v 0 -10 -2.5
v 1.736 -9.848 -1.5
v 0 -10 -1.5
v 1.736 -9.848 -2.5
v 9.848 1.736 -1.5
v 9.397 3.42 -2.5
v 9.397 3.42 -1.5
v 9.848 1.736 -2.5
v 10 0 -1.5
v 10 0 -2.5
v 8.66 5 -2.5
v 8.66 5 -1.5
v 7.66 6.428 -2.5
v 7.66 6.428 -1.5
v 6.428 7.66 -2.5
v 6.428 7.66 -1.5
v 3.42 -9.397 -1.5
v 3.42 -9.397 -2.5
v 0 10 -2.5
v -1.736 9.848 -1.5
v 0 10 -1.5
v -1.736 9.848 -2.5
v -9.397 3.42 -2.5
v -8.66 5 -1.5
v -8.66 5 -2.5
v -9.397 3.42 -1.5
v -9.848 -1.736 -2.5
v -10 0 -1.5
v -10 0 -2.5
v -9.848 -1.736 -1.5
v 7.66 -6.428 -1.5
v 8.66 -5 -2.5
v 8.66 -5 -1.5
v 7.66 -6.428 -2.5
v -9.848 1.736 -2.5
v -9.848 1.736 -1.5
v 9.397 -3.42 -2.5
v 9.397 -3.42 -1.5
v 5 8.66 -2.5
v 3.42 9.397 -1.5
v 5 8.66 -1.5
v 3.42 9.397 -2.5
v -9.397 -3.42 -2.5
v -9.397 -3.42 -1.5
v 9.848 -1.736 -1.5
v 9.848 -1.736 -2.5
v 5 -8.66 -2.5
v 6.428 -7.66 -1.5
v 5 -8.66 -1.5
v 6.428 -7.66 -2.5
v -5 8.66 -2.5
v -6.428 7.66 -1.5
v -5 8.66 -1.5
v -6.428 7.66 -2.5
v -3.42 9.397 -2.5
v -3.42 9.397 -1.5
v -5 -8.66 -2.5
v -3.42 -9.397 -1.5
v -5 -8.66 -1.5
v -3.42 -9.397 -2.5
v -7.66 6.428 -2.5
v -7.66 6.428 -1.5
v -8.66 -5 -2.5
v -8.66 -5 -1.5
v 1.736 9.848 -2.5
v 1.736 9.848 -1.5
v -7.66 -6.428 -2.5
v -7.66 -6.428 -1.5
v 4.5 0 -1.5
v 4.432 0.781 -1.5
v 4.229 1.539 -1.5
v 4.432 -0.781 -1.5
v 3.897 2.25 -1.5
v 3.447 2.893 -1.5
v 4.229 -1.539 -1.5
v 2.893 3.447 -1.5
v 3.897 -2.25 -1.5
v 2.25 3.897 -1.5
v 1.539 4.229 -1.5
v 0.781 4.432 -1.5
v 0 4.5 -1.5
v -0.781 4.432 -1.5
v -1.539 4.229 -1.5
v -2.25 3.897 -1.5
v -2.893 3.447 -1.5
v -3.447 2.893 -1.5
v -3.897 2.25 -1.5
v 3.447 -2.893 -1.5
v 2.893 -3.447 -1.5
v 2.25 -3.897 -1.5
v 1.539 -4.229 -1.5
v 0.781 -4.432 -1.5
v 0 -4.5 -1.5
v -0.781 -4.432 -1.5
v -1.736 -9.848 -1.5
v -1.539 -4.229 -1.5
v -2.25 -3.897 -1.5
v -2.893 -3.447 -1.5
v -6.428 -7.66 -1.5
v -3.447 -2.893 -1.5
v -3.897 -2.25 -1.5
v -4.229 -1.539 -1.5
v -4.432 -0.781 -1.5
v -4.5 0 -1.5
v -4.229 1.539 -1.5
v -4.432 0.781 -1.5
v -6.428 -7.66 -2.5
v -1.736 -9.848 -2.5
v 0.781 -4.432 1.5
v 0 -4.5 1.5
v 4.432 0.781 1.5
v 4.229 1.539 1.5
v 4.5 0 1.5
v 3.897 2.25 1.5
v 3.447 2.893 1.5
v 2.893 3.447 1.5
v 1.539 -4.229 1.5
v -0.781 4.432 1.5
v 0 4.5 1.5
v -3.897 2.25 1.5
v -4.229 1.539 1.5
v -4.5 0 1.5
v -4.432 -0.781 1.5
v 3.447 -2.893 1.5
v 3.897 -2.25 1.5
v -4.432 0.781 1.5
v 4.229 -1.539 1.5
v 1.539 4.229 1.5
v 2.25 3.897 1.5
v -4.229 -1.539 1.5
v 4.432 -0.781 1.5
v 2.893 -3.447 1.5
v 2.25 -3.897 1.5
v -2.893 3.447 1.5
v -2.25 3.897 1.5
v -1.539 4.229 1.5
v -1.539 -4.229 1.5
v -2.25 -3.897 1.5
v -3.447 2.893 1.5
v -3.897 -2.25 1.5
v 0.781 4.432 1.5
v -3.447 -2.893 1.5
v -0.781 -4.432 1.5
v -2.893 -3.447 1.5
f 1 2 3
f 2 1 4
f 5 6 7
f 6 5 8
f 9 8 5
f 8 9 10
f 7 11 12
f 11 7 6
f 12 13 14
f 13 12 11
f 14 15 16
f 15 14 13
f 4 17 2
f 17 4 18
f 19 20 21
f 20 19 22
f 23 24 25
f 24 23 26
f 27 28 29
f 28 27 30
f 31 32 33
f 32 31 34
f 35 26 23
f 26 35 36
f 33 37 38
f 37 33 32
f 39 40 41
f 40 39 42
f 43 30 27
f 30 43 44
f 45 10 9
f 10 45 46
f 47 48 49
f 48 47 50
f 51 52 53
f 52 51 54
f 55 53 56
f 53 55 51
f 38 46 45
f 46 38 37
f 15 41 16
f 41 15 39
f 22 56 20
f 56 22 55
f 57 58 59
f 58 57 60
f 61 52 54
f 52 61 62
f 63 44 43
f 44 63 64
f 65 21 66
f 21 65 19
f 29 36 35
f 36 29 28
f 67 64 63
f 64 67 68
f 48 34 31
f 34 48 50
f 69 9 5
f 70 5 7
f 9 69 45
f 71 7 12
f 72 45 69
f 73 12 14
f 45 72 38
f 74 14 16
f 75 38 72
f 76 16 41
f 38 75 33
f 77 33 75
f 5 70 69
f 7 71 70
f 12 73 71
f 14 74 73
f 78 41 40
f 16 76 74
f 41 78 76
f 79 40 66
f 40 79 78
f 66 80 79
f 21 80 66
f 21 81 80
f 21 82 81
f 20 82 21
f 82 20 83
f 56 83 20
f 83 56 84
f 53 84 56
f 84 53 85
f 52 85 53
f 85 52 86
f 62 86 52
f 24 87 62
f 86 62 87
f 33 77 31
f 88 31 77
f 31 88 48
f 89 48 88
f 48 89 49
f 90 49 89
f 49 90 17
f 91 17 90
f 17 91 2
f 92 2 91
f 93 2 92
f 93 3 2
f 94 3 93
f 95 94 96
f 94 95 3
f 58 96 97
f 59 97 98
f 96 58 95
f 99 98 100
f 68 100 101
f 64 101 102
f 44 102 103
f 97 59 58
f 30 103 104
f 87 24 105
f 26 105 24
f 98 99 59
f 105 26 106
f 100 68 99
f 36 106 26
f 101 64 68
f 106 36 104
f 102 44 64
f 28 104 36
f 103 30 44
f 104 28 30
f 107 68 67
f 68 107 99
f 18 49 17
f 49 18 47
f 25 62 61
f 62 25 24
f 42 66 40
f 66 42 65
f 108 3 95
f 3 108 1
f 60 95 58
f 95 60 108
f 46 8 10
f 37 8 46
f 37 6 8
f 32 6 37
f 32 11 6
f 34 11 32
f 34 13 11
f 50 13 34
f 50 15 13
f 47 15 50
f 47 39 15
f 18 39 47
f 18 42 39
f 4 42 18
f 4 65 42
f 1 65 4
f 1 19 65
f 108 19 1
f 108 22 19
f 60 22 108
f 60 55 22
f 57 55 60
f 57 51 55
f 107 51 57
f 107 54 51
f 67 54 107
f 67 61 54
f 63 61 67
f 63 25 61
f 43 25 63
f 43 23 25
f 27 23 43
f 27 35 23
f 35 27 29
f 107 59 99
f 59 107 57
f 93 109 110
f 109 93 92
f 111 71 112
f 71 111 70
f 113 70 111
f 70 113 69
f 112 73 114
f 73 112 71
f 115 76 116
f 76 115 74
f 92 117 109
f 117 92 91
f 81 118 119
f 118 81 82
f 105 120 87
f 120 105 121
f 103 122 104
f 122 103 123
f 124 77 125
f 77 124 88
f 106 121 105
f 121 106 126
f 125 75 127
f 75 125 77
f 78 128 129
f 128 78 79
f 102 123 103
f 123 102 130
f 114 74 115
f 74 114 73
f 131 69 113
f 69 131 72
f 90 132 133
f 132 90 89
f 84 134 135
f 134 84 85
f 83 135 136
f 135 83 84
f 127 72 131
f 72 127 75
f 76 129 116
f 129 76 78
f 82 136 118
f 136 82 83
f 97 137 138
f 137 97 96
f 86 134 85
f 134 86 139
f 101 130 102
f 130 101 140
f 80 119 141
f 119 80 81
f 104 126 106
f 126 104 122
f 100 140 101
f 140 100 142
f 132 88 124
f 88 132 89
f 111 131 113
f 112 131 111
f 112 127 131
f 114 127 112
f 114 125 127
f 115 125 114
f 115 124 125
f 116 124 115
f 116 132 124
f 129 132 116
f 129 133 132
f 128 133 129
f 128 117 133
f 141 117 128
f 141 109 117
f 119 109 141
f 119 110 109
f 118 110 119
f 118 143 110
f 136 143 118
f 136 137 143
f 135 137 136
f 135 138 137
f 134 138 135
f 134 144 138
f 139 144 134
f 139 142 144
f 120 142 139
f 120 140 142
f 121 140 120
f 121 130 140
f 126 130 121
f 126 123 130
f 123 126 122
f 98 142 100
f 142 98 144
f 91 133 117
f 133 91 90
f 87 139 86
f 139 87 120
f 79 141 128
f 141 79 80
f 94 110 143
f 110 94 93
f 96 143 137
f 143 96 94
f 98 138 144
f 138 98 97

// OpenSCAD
$fn = 36;

module part1()
{
    // inner circle
    difference()
    {
        translate([0,0,0.5]) cylinder(d=20,h=2,center=true);
        cylinder(d=10,h=5,center=true);
    }
    // mount points
    n = 10;
    for( i=[1:n] )
        rotate([0,0,360/n*i])
        {
//            translate([37/2,0,0])
//                cylinder(d1=2, d2=3, h=5); // outer
            translate([17/2,0,0])
                cylinder(d1=2,d2=3,h=5); // inner
        }
}

module part2()
{
    // outer circle
    difference()
    {
    cylinder(d=40,h=3,center=true);
    cylinder(d=35,h=5,center=true);
    }
    // inner cross with low circle below inner circle
    difference()
    {
        union()
        {
            translate([0,0,-1])
                cube([50,5,1],center=true);
            translate([0,0,-1])
                cube([5,50,1],center=true);
            color([1,0,0])
            difference()
            {
                translate([0,0,-1]) cylinder(d=20,h=1,center=true);
                cylinder(d=10,h=5,center=true);
            }
        }
        cylinder(d=10,h=5,center=true);
    }

    // mount points
    n = 10;
    for( i=[1:n] )
        rotate([0,0,360/n*i])
        {
            translate([37/2,0,0])
                cylinder(d1=2, d2=3, h=5); // outer
//            translate([17/2,0,0])
//                cylinder(d1=2,d2=3,h=5); // inner
        }
    }

module part3()
{
    difference()
    {
        translate([0,0,-2]) cylinder(d=20,h=1,center=true);
    //    cylinder(d=10,h=5,center=true);
    }
    translate([0,0,-0.5]) cylinder(d=9,h=4,center=true);
}

part3();
//part2();
//part1();
